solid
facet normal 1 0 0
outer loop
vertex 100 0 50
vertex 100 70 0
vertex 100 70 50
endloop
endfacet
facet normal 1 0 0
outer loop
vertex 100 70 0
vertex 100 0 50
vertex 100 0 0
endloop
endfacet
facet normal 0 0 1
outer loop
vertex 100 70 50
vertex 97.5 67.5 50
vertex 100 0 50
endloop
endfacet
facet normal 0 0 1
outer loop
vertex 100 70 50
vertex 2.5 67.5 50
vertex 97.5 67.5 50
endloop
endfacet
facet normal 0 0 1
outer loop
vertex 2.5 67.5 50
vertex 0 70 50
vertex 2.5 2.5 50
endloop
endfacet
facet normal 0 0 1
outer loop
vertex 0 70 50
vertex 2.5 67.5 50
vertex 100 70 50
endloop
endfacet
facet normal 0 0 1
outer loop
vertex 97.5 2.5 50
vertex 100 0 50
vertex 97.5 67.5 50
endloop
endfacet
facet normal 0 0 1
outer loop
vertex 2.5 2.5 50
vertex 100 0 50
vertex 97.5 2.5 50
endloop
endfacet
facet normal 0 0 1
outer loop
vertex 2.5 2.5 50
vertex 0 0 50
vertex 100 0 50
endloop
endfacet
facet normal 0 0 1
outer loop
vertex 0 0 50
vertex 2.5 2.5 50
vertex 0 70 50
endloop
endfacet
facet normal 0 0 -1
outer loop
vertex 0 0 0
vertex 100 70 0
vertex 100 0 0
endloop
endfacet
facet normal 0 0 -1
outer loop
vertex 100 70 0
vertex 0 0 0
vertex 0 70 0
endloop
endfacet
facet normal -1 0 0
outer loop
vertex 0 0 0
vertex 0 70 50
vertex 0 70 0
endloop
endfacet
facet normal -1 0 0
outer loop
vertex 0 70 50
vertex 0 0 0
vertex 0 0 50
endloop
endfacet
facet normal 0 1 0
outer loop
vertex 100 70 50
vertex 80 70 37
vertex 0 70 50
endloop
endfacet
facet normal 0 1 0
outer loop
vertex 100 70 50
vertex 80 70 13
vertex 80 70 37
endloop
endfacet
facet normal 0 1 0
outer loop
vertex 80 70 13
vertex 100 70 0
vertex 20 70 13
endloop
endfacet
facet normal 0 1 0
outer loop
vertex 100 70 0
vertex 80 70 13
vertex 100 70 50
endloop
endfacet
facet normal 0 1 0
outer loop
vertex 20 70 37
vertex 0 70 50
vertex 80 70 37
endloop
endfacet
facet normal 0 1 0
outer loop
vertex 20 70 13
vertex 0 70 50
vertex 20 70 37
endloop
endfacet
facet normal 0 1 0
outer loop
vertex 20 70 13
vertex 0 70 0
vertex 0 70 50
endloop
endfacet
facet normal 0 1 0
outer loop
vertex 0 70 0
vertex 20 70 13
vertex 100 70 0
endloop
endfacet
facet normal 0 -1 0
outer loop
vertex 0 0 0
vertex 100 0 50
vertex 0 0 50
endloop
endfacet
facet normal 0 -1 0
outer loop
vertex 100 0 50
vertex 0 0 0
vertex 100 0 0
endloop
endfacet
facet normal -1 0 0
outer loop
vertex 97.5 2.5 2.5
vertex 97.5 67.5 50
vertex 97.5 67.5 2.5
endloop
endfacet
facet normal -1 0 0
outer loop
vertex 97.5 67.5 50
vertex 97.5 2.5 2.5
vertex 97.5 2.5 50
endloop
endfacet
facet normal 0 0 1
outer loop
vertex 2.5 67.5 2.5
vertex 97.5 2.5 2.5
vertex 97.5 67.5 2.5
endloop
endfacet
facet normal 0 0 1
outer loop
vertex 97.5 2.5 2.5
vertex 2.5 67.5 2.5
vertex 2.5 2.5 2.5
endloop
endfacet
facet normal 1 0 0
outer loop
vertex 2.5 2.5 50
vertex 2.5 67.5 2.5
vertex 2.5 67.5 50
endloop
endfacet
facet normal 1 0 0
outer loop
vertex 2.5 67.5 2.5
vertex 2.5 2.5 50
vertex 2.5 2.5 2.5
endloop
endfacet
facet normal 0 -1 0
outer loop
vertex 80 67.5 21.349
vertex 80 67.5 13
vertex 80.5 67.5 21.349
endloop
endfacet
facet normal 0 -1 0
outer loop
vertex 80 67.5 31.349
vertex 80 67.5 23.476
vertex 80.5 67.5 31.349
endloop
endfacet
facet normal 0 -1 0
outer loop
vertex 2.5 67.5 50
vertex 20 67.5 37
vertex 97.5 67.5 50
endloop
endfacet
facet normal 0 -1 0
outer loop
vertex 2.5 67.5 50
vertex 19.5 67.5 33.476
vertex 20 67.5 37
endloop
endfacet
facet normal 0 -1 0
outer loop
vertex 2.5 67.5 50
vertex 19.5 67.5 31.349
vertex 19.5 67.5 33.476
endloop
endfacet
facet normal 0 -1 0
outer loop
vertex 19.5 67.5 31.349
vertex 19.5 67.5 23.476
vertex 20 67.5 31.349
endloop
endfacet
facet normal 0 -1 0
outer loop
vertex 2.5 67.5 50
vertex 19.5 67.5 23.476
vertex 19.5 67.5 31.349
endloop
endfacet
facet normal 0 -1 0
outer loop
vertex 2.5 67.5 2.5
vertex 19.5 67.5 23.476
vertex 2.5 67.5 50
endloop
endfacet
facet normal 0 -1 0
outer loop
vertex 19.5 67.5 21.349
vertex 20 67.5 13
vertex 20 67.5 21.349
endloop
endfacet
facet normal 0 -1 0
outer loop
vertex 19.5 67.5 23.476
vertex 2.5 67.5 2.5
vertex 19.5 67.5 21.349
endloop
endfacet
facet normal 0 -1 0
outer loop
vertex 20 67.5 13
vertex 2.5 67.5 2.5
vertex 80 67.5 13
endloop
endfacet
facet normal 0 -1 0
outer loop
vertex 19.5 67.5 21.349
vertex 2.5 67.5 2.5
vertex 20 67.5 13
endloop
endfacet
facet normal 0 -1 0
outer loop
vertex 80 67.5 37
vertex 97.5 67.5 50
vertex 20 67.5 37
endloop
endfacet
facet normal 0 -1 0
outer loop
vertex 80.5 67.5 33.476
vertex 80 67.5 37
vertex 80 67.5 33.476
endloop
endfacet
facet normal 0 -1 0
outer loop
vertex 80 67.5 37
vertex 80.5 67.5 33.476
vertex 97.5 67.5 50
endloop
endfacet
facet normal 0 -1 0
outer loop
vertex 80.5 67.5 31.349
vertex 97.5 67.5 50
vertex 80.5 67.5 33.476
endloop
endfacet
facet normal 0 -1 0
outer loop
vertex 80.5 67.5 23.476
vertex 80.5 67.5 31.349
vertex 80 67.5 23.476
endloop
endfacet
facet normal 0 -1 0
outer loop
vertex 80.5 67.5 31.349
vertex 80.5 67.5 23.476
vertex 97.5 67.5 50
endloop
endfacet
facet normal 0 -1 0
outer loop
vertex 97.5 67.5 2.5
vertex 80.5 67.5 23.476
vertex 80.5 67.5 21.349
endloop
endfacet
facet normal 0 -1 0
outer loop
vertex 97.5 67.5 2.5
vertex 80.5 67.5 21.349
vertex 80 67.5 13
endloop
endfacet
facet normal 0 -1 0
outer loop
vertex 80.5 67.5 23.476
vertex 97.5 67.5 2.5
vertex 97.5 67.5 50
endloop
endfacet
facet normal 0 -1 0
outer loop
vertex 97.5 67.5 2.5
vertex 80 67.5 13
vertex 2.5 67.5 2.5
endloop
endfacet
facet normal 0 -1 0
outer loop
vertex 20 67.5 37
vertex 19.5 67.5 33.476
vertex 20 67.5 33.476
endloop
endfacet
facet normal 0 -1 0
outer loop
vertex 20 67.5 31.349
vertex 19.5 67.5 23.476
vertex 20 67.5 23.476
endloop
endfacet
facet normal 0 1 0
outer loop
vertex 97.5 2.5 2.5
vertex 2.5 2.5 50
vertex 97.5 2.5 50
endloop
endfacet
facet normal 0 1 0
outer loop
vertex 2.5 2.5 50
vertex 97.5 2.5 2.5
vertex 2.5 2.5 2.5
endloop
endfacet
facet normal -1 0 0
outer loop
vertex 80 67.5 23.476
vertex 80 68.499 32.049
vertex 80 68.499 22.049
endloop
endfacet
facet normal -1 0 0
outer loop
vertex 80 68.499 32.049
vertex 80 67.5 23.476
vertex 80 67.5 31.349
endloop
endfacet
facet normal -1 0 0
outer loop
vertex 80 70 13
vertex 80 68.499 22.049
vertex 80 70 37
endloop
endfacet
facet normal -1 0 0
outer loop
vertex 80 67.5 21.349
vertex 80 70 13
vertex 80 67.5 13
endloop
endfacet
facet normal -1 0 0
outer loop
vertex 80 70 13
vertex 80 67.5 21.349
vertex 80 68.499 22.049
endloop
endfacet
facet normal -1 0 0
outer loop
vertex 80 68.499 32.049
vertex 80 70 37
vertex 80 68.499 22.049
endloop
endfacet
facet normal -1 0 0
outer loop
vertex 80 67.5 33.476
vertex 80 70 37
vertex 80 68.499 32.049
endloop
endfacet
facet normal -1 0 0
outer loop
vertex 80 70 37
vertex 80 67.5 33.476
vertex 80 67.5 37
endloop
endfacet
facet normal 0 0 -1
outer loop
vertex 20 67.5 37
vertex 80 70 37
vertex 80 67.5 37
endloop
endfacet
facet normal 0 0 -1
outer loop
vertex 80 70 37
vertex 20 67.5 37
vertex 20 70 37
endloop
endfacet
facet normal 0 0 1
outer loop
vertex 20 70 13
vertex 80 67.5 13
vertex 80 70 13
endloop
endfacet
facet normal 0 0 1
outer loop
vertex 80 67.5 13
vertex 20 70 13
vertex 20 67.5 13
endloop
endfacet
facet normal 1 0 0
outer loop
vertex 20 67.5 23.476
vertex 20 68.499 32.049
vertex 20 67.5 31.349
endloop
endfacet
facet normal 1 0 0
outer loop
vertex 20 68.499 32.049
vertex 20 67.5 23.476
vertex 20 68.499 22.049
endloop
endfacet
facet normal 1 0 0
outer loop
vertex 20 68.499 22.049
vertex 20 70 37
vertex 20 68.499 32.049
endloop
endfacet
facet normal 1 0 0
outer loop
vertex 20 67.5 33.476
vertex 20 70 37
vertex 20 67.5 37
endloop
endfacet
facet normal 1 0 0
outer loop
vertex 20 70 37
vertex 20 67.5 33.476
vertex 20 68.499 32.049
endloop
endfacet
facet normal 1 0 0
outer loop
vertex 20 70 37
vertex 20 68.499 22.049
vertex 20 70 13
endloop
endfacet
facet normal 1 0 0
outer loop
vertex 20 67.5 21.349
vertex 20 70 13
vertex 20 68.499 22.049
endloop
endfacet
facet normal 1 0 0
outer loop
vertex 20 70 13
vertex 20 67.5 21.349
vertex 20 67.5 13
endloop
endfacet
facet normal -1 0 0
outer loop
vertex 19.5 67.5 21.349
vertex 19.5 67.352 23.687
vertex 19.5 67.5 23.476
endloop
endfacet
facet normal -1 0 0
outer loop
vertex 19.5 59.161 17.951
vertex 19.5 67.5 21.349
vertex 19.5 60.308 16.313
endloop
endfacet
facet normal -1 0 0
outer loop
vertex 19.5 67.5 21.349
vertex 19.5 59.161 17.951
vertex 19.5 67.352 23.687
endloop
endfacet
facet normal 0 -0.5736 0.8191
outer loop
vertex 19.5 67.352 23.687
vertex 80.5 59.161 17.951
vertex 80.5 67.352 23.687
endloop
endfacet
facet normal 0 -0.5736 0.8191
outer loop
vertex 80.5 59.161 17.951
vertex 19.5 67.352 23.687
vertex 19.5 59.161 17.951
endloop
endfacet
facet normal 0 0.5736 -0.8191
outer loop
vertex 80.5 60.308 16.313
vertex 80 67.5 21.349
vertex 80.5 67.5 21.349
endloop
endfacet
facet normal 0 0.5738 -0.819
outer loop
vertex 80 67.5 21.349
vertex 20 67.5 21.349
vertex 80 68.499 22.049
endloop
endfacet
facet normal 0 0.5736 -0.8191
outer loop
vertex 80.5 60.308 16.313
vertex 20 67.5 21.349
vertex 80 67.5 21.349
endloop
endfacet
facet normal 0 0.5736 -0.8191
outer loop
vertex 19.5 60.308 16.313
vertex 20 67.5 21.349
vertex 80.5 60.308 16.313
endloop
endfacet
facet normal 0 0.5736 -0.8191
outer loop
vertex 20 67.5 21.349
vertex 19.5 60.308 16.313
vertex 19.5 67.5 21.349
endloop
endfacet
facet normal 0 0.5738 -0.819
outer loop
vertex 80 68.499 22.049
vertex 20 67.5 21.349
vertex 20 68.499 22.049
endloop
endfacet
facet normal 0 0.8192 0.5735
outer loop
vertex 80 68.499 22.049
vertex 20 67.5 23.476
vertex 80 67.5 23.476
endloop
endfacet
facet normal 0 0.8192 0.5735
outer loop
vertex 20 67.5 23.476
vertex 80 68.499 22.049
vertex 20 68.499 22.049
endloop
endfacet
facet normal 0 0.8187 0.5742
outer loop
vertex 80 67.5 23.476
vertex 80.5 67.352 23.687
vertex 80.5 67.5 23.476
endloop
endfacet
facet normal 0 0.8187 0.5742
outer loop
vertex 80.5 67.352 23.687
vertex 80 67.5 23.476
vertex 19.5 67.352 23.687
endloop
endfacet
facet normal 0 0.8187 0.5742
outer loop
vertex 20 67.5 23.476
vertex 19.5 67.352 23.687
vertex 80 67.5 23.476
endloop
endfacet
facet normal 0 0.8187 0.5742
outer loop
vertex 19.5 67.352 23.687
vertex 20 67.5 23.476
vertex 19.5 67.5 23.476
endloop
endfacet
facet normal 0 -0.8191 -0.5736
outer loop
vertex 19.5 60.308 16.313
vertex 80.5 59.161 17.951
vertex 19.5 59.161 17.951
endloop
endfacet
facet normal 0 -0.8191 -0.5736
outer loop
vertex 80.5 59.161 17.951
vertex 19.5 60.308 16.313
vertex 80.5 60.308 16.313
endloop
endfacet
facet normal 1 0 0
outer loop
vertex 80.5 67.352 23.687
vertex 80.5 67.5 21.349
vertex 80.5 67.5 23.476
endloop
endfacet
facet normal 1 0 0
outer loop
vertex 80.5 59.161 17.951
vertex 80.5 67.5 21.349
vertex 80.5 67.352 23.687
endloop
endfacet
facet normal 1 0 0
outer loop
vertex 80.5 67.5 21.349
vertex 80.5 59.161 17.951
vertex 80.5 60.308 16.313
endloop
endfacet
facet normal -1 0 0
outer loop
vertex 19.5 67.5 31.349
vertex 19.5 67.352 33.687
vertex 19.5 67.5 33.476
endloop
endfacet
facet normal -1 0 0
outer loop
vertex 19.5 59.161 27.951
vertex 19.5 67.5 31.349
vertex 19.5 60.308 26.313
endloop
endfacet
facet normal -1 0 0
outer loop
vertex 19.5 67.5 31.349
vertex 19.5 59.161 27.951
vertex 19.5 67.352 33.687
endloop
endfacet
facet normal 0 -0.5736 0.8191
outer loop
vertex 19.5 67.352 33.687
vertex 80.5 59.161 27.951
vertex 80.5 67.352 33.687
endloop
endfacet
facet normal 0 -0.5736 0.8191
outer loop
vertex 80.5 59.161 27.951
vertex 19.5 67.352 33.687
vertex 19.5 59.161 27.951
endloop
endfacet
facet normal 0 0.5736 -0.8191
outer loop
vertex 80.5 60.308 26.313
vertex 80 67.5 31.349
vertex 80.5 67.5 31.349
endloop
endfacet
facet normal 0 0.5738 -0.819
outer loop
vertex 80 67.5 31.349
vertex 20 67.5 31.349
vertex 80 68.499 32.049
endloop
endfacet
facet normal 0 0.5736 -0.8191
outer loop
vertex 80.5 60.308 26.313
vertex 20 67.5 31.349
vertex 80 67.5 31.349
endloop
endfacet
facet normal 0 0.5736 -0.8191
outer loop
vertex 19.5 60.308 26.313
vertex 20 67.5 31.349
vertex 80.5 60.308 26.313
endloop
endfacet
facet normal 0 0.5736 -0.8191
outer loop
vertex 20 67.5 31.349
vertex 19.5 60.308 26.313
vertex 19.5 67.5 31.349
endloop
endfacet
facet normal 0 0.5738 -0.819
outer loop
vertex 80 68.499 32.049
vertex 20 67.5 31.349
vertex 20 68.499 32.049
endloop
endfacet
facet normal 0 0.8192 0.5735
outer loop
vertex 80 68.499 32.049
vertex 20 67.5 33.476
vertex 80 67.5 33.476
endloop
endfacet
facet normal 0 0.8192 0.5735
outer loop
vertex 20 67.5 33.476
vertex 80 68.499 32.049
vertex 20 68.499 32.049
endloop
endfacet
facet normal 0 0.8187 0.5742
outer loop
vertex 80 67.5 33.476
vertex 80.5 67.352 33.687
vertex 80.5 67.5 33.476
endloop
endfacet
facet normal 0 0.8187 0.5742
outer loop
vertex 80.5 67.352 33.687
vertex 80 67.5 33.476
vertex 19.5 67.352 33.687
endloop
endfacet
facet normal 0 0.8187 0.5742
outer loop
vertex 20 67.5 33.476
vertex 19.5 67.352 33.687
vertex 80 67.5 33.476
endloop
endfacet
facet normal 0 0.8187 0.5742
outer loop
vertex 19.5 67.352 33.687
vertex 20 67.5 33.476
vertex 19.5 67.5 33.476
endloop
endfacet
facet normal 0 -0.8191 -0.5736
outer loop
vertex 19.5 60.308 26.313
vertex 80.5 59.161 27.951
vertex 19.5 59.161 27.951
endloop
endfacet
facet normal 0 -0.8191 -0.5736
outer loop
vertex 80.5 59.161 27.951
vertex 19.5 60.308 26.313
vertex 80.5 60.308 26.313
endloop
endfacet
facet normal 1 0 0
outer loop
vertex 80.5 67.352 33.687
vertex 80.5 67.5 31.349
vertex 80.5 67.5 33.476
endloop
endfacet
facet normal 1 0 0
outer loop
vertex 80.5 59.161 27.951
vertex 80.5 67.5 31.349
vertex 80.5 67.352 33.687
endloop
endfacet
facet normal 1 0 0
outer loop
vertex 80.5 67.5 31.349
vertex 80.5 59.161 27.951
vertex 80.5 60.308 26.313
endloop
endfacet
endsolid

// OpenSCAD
$fn = 32;

// ----------------------------------------------------------------------
// Vent box: louvers enclosure
// ----------------------------------------------------------------------

// --- parameters (mm) ---
box_l = 100;              // box length, X
box_w = 70;               // box width, Y
box_h = 50;               // box height, Z
wall_t = 2.5;             // shell wall thickness
win_l = 60;               // vent window width, X
win_h = 24;               // vent window height, Z
slat_t = 2;               // louver slat thickness
slat_d = 10;              // louver slat depth
slat_a = 35;              // louver slat angle, degrees
slat_pitch = 10;          // louver pitch
slat_yc = 63.83;          // slat centreline Y

win_z0 = (box_h - win_h) / 2;  // window lower edge Z
n_slats = 2;  // louver count
slat_z0 = win_z0 + (win_h - (n_slats - 1) * slat_pitch) / 2;

difference() {
  union() {
    difference() {
      cube([box_l, box_w, box_h]);
  translate([wall_t, wall_t, wall_t])
    cube([box_l - 2 * wall_t, box_w - 2 * wall_t, box_h]);
  translate([(box_l - win_l) / 2, box_w - wall_t - 1, win_z0])
    cube([win_l, wall_t + 2, win_h]);
    }
    for (i = [0 : n_slats - 1])
      translate([box_l / 2, slat_yc, slat_z0 + i * slat_pitch])
        rotate([slat_a, 0, 0])
          cube([win_l + 1, slat_d, slat_t], center = true);
  }
}
